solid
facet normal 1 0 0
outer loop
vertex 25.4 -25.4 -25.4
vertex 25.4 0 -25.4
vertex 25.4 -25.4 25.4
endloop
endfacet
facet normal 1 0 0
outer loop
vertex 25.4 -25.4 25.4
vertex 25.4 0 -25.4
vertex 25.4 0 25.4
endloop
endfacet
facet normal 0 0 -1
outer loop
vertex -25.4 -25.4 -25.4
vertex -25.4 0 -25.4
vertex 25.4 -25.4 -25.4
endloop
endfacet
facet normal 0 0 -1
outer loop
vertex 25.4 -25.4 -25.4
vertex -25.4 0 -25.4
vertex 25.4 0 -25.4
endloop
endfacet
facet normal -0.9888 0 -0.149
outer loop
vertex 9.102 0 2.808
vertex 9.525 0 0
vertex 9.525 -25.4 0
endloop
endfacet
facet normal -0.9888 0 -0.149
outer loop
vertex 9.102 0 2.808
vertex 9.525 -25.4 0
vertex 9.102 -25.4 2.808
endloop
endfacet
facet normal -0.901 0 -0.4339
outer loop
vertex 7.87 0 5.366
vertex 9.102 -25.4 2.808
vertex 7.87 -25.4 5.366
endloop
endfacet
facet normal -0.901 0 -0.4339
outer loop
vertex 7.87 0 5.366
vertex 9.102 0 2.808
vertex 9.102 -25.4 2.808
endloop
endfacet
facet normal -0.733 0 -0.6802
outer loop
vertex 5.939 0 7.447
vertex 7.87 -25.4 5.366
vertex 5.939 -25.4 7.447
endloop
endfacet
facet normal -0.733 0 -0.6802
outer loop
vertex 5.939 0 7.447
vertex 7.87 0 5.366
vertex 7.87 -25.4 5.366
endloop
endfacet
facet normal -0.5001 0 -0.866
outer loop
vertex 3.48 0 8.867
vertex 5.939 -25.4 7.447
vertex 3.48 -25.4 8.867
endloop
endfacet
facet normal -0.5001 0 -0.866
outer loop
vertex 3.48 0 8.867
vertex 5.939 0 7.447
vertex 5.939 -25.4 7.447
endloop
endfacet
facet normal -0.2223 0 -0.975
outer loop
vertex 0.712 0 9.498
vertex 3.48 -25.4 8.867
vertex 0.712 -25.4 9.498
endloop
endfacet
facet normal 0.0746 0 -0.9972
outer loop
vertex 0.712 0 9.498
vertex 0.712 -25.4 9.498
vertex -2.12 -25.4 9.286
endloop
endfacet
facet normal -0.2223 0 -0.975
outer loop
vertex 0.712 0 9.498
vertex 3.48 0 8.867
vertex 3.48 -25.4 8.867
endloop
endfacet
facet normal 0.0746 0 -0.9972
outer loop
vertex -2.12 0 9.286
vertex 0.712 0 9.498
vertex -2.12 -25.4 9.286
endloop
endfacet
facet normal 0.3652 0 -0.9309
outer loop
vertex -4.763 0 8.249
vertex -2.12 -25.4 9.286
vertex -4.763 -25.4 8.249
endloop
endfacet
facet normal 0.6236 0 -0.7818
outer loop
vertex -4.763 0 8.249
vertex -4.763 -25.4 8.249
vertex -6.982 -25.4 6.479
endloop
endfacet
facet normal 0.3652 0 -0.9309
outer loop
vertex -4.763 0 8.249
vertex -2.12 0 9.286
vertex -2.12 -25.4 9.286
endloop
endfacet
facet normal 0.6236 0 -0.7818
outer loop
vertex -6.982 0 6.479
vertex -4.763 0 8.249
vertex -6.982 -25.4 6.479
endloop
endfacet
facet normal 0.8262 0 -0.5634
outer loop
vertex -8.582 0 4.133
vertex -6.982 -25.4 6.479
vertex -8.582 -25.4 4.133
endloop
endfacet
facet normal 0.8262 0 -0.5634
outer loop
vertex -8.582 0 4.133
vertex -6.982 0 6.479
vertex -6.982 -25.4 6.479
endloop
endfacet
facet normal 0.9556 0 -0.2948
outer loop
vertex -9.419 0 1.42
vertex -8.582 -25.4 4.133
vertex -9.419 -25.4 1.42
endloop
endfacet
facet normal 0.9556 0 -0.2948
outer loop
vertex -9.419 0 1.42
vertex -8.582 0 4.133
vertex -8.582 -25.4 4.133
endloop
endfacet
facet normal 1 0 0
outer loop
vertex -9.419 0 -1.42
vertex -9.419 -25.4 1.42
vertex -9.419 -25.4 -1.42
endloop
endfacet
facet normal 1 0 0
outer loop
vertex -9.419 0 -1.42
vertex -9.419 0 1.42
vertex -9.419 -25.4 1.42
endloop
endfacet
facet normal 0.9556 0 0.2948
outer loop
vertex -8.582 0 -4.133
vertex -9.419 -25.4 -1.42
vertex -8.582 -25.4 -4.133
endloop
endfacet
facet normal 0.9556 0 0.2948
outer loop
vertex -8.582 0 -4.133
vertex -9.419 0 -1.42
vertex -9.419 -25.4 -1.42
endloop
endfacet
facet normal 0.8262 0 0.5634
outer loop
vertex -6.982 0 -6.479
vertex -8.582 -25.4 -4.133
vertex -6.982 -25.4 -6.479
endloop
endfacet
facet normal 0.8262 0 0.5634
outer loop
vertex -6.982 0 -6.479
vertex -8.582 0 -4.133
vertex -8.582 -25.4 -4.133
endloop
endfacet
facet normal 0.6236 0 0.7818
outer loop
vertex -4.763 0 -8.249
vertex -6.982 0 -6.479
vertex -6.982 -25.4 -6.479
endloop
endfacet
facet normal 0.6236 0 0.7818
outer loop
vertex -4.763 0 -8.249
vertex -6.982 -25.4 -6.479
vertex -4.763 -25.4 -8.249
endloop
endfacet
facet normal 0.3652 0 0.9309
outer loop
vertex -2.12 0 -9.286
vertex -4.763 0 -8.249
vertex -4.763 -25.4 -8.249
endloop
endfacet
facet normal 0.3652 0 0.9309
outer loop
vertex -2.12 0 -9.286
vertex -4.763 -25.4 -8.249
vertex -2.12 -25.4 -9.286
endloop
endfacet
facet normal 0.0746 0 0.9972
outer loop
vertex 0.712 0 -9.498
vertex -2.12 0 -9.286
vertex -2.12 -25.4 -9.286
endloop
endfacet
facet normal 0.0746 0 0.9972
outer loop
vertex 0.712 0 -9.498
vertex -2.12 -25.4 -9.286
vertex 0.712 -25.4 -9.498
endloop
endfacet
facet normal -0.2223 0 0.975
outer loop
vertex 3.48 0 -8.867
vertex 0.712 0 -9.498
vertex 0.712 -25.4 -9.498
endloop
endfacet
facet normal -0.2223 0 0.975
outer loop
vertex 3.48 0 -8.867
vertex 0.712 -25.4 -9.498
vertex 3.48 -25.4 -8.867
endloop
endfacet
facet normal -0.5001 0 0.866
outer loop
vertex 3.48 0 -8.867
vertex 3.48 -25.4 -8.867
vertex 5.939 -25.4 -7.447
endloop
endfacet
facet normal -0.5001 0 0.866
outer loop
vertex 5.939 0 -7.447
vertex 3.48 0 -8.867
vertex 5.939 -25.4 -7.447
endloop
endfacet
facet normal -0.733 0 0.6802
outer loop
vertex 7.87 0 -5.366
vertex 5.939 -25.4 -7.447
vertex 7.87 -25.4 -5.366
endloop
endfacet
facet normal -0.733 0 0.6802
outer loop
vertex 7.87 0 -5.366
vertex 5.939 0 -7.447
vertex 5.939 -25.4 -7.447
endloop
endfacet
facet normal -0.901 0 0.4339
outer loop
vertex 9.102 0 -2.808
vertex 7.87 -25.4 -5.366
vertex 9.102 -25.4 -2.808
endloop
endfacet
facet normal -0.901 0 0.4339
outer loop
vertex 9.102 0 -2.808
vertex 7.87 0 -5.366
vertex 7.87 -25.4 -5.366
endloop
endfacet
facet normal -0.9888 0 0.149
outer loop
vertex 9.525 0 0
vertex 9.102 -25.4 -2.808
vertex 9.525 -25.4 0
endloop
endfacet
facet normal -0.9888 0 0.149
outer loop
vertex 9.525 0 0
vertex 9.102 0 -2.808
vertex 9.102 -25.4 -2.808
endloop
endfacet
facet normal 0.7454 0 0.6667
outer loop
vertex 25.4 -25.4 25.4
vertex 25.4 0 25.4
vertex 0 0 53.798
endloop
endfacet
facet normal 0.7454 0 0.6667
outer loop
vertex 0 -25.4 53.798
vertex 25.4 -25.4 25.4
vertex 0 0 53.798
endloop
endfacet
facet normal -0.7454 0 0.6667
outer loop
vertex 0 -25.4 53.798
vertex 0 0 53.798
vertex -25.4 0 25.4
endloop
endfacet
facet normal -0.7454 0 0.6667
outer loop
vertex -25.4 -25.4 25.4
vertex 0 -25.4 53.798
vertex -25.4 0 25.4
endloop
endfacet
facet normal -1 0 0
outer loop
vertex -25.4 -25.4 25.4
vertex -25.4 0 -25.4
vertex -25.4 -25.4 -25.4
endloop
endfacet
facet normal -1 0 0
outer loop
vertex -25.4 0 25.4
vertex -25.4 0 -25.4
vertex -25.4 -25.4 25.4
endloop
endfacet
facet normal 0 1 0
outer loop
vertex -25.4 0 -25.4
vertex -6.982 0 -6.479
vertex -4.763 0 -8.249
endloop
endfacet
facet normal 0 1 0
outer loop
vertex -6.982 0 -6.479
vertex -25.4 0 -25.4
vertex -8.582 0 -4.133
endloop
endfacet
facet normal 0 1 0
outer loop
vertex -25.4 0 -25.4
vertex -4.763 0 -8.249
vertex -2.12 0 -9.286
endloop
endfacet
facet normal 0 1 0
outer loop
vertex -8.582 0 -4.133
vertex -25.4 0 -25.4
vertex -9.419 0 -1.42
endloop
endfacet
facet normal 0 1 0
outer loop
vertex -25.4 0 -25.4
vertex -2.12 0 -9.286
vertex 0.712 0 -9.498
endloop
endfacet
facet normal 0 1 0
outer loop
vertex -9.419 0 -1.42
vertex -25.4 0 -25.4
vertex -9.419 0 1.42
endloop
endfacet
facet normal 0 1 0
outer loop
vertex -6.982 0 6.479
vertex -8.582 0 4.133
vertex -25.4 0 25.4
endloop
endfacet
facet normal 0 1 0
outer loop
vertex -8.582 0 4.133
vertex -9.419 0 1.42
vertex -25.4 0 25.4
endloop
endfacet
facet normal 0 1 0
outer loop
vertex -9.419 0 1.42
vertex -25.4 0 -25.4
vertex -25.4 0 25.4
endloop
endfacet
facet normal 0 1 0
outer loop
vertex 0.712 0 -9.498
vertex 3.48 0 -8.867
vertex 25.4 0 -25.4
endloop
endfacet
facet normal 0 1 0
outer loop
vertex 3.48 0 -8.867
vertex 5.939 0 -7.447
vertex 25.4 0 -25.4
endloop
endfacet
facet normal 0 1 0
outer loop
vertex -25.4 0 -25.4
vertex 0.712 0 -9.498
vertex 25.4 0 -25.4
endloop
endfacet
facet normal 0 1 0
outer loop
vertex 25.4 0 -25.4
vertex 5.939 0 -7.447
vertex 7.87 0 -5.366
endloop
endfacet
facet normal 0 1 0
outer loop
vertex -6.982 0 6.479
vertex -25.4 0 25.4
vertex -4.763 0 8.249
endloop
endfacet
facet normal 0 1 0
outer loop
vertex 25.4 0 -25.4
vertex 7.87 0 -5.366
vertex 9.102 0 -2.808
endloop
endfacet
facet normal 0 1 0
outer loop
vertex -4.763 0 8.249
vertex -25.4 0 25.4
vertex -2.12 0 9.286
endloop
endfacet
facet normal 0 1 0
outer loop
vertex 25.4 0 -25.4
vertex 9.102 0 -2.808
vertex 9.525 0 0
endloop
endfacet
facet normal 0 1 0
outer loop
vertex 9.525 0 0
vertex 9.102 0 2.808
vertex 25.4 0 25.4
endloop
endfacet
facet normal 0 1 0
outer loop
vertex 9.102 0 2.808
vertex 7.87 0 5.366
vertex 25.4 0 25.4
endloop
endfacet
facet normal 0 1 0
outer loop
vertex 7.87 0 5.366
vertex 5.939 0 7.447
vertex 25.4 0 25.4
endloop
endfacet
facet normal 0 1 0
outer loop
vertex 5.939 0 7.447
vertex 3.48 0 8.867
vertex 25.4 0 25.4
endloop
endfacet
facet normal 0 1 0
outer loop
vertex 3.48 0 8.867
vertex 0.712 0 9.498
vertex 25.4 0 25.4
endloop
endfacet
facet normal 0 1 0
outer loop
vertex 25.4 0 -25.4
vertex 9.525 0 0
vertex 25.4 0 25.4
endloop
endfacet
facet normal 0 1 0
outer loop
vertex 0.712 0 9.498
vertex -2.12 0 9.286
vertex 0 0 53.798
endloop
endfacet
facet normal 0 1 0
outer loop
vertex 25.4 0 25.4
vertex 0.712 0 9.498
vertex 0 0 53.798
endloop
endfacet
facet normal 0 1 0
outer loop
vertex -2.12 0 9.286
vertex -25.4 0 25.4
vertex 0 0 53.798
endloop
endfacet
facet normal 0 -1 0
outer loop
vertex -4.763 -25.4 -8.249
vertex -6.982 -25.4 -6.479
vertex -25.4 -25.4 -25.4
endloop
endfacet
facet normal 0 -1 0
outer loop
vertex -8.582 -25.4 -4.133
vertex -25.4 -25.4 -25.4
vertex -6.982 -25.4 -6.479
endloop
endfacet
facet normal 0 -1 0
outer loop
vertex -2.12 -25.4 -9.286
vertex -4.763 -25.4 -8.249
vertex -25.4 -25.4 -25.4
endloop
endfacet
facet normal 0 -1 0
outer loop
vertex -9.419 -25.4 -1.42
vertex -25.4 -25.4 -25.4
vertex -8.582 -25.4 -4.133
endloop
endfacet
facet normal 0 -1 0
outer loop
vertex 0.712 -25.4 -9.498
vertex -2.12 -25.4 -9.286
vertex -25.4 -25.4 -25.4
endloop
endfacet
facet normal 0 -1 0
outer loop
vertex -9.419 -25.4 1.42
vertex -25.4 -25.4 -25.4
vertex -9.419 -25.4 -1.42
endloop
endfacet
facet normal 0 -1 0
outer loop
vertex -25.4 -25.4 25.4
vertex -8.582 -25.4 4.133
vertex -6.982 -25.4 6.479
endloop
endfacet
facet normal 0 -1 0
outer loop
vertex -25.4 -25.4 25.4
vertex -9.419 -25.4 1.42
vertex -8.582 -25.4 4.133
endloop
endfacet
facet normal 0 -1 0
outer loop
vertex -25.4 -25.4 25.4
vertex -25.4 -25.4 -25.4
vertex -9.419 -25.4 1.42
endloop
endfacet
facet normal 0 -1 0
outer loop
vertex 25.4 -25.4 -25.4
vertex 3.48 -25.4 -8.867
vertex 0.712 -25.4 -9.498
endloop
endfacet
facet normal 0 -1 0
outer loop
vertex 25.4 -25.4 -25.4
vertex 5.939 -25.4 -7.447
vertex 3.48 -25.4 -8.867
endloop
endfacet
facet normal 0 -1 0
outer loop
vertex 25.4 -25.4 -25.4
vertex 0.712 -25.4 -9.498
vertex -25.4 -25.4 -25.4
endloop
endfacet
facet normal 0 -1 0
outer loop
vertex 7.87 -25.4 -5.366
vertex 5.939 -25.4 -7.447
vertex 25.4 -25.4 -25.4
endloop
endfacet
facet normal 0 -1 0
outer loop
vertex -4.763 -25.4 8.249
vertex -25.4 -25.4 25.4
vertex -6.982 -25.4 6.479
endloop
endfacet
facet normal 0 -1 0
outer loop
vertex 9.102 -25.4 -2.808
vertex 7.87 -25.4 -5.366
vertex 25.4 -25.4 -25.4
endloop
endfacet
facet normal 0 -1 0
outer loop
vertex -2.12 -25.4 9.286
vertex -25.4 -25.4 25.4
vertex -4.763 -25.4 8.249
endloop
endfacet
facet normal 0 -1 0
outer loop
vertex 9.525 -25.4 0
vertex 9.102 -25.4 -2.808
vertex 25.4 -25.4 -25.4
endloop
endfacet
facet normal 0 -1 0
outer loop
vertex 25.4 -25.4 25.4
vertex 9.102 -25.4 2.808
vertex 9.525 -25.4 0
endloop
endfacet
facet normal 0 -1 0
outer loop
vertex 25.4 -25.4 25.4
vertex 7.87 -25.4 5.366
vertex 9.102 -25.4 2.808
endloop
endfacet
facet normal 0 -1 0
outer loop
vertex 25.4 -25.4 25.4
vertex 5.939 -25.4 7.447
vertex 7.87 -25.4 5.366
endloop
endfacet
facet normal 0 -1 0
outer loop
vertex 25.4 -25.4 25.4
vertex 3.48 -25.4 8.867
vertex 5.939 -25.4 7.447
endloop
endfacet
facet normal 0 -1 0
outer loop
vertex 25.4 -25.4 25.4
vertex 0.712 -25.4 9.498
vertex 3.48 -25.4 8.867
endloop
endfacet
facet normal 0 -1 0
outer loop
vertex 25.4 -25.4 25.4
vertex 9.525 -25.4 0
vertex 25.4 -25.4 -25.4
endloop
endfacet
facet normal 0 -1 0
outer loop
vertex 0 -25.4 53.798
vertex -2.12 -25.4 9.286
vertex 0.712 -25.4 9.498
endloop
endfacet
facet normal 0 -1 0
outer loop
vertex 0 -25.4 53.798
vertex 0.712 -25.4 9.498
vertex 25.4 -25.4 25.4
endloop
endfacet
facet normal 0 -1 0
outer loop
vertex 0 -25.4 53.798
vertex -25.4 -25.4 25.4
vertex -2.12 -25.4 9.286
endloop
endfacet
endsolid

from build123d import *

# Parameters (mm, degrees)
F0_W     = 50.8
F0_H     = 50.8
F0_R     = 9.525
F1_DEPTH = 25.4


with BuildPart() as f1:
    # F0 (on Front) → F1 (new body)
    with BuildSketch(Plane.XZ):
        Rectangle(F0_W, F0_H)
        Circle(F0_R, mode=Mode.SUBTRACT)
        Polygon((0, 53.798063), (-25.4, 25.4), (25.4, 25.4), align=None)
    extrude(amount=F1_DEPTH)


solid = f1.part
